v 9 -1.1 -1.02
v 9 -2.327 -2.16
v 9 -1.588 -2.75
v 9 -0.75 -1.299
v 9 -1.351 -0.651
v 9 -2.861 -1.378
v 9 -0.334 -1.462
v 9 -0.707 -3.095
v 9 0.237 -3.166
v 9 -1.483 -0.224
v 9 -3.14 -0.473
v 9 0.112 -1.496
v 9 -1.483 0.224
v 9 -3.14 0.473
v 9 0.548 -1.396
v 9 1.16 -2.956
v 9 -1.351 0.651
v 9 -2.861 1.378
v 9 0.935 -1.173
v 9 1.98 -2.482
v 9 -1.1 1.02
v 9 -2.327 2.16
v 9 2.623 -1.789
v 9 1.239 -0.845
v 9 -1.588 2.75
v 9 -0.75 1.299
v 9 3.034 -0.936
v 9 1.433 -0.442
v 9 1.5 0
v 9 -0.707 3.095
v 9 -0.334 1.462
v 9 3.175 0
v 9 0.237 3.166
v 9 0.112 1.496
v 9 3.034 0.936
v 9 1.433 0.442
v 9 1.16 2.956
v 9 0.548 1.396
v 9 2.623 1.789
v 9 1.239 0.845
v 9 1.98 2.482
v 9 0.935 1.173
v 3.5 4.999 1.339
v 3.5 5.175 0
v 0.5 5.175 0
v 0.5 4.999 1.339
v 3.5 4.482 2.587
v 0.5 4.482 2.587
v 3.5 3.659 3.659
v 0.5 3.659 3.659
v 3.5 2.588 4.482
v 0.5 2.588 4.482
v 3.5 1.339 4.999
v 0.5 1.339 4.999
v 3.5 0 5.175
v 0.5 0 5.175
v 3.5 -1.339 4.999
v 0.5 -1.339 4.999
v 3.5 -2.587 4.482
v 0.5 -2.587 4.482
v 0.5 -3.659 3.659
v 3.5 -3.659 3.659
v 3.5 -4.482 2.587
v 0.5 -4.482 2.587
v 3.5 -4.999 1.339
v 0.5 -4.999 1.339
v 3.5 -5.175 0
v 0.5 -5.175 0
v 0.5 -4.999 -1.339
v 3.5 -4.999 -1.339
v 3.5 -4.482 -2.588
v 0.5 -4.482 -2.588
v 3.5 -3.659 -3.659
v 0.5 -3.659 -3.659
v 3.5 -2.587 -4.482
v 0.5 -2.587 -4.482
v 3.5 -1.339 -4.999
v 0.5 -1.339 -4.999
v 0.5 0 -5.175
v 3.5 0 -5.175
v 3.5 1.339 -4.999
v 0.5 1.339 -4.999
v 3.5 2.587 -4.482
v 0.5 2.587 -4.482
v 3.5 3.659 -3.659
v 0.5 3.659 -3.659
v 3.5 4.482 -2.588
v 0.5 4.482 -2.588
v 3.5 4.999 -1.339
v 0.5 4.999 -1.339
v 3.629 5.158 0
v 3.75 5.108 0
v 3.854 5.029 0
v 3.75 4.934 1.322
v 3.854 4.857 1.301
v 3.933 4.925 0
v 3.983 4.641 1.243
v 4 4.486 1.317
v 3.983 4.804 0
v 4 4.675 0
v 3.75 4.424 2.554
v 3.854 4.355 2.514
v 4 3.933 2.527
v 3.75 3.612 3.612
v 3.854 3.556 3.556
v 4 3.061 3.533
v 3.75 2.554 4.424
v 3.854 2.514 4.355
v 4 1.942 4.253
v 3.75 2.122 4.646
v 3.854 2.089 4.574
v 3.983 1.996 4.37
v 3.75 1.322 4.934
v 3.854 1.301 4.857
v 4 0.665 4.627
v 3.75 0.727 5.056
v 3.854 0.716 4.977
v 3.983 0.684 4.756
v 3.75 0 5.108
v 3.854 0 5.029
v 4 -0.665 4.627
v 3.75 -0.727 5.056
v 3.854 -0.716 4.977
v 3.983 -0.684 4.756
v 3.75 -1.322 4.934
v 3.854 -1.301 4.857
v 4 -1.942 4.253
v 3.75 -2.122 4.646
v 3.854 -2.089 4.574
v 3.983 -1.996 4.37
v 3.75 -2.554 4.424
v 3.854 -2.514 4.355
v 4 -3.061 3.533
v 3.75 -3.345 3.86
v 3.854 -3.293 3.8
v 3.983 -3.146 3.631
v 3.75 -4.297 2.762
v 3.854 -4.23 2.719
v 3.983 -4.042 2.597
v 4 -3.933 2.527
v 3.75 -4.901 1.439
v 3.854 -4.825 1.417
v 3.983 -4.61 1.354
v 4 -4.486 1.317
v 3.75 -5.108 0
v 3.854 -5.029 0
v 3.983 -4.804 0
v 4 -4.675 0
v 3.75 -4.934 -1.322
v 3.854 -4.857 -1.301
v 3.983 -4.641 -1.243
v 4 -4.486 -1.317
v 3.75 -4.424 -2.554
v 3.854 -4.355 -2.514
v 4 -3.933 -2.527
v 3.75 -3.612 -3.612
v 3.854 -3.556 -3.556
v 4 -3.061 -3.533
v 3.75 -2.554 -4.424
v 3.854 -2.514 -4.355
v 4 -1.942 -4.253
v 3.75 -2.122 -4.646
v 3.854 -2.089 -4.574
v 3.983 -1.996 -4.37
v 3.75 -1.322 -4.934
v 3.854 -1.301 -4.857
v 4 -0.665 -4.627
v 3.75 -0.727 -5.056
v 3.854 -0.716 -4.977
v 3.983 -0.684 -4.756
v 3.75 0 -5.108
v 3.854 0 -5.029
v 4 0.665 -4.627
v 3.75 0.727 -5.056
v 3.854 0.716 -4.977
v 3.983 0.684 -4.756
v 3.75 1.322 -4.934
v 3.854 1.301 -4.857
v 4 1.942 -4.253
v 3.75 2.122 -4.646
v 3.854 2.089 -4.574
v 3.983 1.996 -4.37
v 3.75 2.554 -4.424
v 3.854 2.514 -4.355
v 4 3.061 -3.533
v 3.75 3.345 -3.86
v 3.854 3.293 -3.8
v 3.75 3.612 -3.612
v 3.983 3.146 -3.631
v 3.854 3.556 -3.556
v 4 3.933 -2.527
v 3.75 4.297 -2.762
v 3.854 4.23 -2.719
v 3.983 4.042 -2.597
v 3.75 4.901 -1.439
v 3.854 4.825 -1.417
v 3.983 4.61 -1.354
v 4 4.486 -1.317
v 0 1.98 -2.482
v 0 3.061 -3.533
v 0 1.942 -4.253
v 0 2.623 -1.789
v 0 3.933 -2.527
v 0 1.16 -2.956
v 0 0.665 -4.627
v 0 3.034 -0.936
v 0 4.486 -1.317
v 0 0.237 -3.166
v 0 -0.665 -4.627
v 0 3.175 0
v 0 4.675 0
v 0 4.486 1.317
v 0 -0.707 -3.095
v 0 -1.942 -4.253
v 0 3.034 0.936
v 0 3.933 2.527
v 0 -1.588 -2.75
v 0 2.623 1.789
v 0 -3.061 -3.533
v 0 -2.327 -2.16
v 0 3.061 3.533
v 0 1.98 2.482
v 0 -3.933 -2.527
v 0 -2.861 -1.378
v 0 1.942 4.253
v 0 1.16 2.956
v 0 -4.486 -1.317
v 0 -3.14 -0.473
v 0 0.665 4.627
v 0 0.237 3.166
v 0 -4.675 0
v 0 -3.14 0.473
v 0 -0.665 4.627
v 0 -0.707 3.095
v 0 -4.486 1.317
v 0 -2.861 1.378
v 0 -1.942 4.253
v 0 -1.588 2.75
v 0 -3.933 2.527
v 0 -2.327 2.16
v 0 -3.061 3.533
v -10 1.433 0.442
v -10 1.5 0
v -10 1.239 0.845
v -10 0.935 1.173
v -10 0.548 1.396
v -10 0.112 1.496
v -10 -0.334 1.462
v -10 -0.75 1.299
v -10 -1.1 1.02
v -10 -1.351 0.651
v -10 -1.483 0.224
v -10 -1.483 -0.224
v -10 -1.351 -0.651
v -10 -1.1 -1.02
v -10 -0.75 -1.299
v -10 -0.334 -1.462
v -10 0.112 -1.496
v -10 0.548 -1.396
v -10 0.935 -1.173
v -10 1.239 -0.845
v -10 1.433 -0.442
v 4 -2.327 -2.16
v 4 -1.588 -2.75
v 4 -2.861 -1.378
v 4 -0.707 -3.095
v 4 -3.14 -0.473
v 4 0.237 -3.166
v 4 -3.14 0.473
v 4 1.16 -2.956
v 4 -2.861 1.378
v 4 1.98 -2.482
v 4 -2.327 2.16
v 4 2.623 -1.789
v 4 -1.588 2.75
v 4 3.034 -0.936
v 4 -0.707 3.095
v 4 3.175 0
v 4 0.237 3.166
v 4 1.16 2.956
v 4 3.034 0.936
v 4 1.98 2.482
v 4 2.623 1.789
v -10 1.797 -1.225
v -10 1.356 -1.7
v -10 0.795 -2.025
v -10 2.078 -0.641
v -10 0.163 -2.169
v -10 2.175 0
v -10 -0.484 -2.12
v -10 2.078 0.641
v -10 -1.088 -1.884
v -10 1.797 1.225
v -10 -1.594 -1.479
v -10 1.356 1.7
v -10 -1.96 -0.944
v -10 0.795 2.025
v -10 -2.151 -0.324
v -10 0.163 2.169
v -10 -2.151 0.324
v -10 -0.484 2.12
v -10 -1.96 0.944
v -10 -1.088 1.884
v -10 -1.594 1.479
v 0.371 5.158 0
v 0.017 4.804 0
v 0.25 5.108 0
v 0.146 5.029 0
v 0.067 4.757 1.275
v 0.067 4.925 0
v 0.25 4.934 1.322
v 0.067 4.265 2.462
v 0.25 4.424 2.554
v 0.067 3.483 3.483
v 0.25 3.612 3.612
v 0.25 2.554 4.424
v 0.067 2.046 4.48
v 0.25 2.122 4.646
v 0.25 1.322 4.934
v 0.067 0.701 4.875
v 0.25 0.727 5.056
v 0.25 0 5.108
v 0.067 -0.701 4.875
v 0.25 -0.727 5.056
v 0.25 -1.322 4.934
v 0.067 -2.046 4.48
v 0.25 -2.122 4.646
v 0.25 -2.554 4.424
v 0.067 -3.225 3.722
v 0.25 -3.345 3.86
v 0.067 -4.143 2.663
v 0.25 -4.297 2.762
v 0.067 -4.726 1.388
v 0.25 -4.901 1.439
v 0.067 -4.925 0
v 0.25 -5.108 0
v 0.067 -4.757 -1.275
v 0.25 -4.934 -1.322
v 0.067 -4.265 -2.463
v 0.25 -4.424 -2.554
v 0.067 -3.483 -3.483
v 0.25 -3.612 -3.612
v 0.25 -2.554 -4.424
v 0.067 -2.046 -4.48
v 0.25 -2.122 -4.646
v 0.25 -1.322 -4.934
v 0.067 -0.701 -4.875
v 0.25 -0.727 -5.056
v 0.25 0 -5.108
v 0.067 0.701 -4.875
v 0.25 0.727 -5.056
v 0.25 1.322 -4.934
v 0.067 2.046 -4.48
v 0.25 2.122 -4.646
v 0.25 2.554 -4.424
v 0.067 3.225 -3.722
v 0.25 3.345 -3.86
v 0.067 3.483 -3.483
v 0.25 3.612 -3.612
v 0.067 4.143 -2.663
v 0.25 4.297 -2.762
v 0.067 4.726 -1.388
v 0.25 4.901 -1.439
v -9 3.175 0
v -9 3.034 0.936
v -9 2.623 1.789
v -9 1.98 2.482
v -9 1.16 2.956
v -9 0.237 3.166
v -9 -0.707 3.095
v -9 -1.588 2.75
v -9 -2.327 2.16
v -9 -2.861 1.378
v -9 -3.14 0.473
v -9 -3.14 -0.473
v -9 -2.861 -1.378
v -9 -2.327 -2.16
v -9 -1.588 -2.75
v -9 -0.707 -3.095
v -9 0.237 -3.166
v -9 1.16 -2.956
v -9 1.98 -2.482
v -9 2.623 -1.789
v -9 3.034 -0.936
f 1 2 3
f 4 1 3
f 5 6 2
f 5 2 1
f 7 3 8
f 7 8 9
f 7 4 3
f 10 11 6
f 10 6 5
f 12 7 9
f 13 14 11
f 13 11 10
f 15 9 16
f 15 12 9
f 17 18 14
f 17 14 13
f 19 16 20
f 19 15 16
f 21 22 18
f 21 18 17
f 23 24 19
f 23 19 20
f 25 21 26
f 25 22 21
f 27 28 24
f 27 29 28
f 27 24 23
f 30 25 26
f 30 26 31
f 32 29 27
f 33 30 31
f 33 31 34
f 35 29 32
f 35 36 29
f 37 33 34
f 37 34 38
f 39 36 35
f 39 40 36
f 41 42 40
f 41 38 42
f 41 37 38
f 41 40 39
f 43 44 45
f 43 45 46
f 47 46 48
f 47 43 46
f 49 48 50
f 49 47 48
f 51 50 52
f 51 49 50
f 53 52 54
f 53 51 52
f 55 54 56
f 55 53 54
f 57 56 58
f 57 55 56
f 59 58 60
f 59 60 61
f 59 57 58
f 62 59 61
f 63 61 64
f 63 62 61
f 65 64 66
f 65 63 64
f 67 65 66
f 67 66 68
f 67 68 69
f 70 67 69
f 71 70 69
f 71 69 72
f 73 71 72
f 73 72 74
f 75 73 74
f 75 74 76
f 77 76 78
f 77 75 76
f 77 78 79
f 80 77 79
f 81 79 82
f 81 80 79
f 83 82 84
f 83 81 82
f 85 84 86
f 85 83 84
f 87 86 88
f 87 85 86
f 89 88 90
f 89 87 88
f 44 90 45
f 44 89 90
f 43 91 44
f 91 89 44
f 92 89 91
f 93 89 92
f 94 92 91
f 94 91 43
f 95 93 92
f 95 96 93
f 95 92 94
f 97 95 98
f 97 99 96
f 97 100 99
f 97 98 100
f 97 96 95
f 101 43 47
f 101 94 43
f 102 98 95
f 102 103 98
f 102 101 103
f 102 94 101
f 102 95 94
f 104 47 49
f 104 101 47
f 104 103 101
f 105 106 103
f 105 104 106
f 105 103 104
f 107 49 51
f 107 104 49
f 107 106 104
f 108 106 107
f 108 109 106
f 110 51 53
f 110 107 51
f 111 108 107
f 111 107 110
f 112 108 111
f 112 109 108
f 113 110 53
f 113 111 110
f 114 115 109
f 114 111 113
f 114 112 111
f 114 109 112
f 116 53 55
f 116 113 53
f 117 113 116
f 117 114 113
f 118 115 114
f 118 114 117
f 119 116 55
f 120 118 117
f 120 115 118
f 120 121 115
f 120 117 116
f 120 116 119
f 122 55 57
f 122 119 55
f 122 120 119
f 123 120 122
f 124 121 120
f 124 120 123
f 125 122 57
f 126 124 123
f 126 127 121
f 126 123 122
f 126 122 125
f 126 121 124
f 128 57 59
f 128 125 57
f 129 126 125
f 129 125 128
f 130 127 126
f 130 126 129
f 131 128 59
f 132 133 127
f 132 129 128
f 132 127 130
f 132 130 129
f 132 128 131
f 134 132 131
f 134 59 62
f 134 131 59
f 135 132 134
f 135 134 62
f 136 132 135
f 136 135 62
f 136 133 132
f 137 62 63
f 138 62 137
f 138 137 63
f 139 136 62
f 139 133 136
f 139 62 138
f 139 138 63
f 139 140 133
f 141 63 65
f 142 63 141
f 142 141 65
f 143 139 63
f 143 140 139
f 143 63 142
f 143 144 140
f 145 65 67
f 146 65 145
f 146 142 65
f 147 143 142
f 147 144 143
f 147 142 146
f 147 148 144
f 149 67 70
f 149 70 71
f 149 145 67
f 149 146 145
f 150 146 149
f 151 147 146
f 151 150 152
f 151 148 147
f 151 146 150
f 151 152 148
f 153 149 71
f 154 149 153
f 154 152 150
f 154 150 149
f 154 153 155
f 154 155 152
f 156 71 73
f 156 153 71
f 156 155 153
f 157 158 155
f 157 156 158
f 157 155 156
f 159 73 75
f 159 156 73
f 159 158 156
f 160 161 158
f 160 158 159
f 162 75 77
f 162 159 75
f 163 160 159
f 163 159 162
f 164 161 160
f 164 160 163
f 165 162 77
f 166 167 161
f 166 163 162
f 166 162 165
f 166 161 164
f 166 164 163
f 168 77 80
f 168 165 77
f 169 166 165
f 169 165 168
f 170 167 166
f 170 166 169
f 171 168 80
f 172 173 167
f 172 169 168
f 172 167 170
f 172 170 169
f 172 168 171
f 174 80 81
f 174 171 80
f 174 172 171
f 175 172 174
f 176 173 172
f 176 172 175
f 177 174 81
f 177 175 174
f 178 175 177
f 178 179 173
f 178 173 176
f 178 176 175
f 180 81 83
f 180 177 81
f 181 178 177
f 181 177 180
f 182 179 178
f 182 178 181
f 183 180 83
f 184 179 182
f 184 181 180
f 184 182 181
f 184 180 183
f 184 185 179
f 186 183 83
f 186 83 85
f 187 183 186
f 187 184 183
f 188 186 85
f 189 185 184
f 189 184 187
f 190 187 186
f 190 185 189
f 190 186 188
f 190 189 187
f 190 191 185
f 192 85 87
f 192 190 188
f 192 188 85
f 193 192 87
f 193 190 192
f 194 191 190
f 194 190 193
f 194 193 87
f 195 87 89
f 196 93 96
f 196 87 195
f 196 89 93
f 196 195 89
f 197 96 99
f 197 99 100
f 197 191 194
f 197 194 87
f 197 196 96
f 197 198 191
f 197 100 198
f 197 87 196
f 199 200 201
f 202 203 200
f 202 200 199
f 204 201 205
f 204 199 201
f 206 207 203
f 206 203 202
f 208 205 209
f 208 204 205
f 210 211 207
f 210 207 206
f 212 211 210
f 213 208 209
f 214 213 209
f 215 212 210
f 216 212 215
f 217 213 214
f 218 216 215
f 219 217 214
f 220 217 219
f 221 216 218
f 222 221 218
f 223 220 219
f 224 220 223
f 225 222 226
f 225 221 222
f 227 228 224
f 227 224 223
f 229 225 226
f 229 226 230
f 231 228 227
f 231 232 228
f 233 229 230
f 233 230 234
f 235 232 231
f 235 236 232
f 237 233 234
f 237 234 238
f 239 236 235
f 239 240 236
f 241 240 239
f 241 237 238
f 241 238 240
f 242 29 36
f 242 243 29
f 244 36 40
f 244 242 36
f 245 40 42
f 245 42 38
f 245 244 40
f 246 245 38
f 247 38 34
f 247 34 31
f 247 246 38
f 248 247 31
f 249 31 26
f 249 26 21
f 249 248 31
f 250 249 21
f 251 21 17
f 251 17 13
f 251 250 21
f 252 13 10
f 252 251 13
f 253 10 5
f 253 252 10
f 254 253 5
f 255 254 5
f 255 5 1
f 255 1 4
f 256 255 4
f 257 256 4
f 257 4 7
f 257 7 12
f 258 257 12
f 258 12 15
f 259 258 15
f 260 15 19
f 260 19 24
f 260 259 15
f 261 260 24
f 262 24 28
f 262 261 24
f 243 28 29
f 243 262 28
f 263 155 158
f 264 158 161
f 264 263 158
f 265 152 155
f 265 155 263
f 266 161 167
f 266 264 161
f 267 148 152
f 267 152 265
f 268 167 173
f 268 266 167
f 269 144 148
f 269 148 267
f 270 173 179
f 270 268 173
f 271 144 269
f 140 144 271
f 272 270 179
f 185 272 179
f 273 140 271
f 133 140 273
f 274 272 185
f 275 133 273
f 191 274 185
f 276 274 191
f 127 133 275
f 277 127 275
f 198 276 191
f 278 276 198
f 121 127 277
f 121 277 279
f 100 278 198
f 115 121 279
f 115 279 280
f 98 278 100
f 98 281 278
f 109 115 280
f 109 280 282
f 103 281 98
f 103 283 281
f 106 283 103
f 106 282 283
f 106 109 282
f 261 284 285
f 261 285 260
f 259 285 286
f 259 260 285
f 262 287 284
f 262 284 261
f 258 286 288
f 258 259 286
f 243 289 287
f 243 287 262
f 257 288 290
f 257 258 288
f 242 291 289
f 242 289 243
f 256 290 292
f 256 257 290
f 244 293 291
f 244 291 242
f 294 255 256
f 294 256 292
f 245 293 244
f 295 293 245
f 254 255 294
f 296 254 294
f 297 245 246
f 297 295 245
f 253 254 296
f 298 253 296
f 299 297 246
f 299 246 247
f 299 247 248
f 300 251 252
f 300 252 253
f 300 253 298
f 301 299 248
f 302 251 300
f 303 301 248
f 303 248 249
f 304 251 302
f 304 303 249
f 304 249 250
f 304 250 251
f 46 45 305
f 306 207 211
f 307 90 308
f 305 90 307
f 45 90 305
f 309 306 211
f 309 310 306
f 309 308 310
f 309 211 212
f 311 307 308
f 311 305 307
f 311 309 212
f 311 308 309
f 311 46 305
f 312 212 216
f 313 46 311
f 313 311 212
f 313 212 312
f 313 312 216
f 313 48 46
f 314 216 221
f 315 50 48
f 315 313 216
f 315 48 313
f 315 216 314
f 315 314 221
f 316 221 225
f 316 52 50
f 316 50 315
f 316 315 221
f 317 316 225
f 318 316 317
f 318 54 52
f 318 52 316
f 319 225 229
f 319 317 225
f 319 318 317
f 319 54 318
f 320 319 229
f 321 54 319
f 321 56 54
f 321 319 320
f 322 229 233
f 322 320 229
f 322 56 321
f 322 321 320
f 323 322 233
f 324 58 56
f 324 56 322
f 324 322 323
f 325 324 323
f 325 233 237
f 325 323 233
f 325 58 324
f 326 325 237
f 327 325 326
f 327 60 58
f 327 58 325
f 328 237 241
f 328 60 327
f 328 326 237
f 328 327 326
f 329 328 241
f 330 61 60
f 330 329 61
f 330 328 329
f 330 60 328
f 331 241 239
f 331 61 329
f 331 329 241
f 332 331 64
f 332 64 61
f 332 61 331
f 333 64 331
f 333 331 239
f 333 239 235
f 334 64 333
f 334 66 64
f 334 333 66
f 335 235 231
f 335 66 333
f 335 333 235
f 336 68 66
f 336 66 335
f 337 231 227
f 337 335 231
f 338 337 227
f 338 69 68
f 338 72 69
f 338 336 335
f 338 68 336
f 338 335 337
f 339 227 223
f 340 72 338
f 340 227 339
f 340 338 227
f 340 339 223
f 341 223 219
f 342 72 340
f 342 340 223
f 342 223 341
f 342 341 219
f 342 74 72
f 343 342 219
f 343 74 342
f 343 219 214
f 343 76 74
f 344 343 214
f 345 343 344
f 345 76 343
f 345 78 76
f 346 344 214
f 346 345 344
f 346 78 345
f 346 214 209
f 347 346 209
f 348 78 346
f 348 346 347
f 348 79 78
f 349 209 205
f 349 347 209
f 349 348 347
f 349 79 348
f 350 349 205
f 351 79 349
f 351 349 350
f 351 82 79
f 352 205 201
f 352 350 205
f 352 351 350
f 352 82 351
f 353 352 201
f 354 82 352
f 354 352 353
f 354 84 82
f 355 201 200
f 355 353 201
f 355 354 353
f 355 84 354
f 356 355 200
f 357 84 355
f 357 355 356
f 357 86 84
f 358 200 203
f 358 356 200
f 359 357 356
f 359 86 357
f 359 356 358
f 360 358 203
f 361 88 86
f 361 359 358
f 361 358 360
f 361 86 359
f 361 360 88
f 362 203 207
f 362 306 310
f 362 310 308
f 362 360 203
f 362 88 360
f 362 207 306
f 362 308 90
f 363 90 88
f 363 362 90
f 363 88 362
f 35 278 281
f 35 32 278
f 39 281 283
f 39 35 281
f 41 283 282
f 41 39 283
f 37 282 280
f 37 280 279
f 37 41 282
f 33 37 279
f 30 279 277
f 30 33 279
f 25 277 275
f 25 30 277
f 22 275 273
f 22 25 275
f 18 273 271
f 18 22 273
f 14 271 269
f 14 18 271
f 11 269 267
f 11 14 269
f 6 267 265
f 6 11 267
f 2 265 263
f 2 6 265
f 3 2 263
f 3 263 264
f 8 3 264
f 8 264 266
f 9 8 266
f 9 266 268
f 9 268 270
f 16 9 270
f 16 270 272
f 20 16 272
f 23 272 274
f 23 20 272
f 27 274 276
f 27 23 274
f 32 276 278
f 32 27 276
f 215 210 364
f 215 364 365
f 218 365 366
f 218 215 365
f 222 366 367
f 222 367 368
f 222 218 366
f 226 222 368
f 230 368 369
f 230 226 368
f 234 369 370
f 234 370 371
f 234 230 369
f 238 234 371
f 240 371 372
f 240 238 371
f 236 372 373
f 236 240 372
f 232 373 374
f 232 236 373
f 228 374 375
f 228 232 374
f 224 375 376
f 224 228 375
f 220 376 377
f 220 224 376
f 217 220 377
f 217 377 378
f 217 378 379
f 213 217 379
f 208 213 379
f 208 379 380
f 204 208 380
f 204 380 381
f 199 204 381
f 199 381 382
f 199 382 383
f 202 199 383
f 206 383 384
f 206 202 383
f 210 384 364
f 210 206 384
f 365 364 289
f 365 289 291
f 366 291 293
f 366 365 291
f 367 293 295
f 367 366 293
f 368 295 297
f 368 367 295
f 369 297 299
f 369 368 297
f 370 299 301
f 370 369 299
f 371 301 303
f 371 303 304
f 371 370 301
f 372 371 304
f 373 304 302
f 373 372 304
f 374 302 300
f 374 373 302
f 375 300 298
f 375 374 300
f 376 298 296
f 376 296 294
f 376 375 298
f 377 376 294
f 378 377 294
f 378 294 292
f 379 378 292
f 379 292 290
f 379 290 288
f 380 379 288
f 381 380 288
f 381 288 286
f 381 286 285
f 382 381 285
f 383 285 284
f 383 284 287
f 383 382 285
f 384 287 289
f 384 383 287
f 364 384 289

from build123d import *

# Parameters (mm, degrees)
CHAMFER1_SIZE = 1
FILLET1_R     = 0.5


with BuildPart() as part:
    # Sketch1 → Revolve1 (revolve)
    with BuildSketch(Plane.XY):
        Polygon((-10, 1.5), (-10, 3.175), (0, 3.175), (0, 5.175), (4, 5.175), (4, 3.175), (9, 3.175), (9, 1.5), align=None)
    revolve(axis=Axis((-34.824359623, 0, 0), (1, 0, 0)))

    # Chamfer1
    chamfer1_edges = [part.edges().sort_by_distance(p)[0] for p in [
        (-10, -3.175, 0),
    ]]
    chamfer(chamfer1_edges, length=CHAMFER1_SIZE)

    # Fillet1
    fillet1_edges = [part.edges().sort_by_distance(p)[0] for p in [
        (0, -5.175, 0),
        (4, -5.175, 0),
    ]]
    fillet(fillet1_edges, radius=FILLET1_R)


solid = part.part
